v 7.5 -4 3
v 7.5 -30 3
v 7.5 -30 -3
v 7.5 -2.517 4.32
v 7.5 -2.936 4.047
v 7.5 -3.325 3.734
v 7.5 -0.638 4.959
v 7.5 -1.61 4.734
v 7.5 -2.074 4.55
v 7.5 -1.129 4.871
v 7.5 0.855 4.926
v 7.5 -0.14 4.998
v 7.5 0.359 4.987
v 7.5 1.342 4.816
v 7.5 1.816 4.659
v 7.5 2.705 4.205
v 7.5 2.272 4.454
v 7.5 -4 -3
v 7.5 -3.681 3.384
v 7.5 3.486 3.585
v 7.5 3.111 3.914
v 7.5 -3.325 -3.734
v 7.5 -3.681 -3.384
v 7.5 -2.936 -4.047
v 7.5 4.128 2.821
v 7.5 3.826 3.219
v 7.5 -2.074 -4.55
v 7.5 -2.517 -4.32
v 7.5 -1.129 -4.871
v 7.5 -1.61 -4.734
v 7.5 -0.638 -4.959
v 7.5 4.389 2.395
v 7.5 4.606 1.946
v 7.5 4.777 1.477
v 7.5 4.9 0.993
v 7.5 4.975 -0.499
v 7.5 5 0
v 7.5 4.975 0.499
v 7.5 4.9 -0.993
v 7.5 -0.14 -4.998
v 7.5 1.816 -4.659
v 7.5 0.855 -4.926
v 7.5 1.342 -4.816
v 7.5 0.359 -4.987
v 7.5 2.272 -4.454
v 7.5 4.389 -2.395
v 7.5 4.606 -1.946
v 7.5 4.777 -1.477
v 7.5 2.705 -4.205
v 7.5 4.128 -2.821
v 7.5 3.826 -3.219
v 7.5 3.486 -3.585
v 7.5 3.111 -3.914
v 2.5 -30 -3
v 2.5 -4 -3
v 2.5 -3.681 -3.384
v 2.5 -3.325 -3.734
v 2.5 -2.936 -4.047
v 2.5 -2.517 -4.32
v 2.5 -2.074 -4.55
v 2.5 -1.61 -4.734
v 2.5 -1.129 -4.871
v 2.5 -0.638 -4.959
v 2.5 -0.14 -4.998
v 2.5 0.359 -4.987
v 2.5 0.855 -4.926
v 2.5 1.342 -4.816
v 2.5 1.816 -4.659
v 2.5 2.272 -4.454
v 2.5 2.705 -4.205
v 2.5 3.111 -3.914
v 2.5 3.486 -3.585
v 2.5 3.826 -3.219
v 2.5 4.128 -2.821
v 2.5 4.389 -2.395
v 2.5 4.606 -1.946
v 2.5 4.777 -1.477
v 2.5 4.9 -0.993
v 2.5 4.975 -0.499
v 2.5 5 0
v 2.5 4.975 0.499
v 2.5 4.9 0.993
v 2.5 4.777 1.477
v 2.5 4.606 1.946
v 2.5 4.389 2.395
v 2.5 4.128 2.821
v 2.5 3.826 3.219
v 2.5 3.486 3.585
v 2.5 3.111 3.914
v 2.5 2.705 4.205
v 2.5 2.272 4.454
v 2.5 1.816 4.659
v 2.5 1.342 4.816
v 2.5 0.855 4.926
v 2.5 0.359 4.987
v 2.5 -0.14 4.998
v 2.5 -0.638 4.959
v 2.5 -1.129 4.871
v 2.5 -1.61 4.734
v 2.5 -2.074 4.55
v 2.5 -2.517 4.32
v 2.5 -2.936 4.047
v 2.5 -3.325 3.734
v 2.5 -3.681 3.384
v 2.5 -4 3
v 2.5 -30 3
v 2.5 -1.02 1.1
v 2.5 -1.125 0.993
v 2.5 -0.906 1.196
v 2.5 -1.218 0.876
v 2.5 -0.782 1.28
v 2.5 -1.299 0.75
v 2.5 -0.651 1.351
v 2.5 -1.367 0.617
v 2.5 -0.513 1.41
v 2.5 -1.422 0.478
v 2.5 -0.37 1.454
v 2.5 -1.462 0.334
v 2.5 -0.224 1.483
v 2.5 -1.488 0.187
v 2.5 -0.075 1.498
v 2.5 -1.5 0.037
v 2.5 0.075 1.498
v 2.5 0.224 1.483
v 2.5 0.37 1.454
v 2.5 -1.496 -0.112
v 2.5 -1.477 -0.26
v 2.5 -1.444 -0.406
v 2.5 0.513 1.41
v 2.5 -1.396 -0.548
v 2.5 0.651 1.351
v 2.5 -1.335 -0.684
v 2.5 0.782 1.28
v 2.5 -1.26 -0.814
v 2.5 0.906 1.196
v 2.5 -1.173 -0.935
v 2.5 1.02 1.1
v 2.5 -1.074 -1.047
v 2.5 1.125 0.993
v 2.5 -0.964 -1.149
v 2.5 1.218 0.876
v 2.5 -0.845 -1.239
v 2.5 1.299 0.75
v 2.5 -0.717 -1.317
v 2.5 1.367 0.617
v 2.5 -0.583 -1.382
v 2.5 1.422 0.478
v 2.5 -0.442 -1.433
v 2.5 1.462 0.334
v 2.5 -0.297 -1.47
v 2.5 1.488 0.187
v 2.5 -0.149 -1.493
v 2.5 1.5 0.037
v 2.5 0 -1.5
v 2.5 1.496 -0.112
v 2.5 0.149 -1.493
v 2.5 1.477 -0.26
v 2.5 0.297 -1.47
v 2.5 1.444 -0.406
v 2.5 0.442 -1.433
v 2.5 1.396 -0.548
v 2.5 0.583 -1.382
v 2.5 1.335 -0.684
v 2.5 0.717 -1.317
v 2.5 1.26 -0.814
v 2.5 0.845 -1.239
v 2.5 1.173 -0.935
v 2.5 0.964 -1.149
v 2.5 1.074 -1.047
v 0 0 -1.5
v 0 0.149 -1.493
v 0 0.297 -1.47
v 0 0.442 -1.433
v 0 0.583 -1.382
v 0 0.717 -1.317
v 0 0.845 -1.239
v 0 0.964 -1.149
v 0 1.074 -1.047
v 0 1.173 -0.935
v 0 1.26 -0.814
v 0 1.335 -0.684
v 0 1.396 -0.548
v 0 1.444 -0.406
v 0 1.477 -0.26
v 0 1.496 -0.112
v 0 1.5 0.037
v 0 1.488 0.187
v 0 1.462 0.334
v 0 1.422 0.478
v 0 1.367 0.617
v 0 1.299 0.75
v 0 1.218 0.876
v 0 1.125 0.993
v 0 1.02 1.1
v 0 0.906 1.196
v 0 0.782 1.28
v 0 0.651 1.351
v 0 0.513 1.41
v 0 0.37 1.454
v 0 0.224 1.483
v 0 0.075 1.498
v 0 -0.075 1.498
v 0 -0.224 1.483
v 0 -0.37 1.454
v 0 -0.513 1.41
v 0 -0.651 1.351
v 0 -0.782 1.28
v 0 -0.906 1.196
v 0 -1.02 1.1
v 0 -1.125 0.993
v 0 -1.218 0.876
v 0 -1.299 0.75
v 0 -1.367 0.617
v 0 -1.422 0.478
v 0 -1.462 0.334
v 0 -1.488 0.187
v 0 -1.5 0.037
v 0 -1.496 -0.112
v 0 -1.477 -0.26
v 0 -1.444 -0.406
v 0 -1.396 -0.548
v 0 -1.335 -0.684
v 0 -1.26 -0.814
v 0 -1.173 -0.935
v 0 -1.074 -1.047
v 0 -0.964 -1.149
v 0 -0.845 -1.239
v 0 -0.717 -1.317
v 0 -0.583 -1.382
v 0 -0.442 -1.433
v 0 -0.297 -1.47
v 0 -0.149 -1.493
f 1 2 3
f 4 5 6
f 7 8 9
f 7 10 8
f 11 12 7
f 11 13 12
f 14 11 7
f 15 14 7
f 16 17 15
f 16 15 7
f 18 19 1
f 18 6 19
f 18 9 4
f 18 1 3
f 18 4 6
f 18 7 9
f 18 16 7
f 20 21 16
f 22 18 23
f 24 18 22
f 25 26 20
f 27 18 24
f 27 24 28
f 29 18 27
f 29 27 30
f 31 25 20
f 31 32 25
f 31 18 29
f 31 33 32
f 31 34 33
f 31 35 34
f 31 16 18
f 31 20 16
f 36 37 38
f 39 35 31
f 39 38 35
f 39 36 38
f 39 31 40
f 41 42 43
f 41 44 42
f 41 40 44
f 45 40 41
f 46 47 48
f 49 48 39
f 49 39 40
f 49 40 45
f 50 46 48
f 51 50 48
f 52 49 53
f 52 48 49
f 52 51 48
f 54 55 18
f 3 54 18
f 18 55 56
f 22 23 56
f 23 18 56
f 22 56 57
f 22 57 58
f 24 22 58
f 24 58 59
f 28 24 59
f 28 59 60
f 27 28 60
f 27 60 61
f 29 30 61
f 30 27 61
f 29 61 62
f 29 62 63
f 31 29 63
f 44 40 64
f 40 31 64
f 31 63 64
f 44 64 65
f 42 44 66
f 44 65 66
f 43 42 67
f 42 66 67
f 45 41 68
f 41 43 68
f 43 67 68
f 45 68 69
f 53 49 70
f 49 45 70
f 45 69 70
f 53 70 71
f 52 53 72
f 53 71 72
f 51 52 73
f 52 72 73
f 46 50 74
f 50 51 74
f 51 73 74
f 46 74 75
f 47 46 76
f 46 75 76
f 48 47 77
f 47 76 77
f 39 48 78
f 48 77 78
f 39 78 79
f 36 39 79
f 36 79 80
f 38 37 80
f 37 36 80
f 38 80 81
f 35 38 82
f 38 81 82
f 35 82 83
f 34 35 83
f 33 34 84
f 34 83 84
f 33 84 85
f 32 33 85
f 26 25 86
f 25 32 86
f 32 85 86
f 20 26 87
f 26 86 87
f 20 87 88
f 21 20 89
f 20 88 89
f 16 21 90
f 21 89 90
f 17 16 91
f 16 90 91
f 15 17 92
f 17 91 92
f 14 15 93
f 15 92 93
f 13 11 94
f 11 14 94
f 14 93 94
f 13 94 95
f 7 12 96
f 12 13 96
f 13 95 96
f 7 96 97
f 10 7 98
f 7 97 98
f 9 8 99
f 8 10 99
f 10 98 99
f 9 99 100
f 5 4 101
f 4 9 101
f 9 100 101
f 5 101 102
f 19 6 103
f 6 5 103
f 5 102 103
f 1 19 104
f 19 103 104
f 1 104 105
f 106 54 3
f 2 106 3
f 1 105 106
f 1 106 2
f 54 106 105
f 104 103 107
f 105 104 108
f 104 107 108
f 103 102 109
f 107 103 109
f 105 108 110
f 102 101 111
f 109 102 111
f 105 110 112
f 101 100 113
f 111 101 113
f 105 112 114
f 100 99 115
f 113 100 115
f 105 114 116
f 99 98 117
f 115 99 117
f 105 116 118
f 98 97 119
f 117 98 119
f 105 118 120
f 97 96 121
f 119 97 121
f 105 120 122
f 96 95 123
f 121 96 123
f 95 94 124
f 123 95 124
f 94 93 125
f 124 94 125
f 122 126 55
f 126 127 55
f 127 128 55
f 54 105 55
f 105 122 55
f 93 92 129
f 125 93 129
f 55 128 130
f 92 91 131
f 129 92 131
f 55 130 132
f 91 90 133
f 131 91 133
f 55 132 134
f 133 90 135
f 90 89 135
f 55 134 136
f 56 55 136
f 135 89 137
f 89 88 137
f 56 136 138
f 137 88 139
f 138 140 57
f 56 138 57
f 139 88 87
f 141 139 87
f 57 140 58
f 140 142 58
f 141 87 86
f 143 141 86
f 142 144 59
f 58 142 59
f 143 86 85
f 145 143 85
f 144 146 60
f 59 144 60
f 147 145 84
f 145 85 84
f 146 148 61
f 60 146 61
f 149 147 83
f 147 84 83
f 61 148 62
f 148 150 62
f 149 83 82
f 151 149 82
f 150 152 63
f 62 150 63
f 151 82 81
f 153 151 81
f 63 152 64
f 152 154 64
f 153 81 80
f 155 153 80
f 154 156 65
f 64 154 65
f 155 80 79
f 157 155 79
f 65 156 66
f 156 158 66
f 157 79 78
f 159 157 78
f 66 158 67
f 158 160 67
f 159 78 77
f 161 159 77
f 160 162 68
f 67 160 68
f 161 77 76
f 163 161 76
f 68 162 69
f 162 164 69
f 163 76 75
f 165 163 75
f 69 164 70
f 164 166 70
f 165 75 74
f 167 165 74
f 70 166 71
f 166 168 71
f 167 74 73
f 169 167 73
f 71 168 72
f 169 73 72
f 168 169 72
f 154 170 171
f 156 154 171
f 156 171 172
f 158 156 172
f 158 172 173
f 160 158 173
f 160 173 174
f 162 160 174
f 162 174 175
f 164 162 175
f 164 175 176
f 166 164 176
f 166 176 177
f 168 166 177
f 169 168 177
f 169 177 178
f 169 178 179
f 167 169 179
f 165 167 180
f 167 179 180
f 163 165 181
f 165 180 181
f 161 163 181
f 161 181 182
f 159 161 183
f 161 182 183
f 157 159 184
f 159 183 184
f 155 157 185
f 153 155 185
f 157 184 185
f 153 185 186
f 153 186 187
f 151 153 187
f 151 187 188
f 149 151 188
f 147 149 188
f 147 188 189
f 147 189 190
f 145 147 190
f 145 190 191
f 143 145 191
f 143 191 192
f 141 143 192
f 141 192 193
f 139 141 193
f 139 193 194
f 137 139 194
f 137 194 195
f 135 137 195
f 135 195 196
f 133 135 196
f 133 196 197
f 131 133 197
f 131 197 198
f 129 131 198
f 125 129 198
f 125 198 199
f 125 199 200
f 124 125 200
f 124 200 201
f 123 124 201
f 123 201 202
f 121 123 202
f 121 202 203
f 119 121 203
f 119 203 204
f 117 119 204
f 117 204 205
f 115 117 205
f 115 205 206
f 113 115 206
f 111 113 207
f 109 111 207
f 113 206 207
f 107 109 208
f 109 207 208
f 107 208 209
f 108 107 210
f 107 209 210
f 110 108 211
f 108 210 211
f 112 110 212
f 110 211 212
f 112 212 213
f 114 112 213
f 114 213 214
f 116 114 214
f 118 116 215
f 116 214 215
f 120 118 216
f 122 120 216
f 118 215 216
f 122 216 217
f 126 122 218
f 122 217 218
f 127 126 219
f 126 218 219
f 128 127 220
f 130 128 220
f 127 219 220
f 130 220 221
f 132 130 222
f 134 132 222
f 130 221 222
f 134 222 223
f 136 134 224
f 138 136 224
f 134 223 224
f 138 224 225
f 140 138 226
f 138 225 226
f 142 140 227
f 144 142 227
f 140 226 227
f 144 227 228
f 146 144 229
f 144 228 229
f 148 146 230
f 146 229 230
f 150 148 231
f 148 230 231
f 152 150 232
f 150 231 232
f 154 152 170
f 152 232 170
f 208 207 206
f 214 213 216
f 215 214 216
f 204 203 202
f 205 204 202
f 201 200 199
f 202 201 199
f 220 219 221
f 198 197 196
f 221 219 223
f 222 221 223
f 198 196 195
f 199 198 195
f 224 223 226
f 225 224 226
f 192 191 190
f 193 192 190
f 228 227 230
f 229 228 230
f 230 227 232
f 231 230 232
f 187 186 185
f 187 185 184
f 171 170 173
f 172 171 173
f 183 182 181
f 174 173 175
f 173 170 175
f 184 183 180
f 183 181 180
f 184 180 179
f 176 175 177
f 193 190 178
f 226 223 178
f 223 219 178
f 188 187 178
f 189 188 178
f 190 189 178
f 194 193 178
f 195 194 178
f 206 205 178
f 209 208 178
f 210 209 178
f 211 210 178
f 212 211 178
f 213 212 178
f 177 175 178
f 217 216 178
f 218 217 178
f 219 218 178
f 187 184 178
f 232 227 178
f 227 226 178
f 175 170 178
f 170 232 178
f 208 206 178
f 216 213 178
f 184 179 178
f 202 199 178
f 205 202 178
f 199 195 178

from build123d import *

# Parameters (mm, degrees)
SKETCH_1_R      = 1.5
EXTRUDE_1_DEPTH = 2.5
SKETCH_2_R      = 5
EXTRUDE_2_DEPTH = 5
SKETCH_3_W      = 5
SKETCH_3_H      = 6
EXTRUDE_3_DEPTH = 30


with BuildPart() as part:
    # 草图1 → 凸台-拉伸1 (new body)
    with BuildSketch(Plane(origin=(0, 0, 0), x_dir=(0, 0, -1), z_dir=(1, 0, 0))):
        Circle(SKETCH_1_R)
    extrude(amount=EXTRUDE_1_DEPTH)

    # 草图2 → 凸台-拉伸2 (add)
    with BuildSketch(Plane(origin=(2.5, 0, 0), x_dir=(0, 0, -1), z_dir=(1, 0, 0))):
        Circle(SKETCH_2_R)
    extrude(amount=EXTRUDE_2_DEPTH)

    # 草图3 → 凸台-拉伸3 (add)
    with BuildSketch(Plane(origin=(0, 0, 0), x_dir=(1, 0, 0), z_dir=(0, 1, 0))):
        with Locations((5, 0)):
            Rectangle(SKETCH_3_W, SKETCH_3_H)
    extrude(amount=-EXTRUDE_3_DEPTH)


solid = part.part
